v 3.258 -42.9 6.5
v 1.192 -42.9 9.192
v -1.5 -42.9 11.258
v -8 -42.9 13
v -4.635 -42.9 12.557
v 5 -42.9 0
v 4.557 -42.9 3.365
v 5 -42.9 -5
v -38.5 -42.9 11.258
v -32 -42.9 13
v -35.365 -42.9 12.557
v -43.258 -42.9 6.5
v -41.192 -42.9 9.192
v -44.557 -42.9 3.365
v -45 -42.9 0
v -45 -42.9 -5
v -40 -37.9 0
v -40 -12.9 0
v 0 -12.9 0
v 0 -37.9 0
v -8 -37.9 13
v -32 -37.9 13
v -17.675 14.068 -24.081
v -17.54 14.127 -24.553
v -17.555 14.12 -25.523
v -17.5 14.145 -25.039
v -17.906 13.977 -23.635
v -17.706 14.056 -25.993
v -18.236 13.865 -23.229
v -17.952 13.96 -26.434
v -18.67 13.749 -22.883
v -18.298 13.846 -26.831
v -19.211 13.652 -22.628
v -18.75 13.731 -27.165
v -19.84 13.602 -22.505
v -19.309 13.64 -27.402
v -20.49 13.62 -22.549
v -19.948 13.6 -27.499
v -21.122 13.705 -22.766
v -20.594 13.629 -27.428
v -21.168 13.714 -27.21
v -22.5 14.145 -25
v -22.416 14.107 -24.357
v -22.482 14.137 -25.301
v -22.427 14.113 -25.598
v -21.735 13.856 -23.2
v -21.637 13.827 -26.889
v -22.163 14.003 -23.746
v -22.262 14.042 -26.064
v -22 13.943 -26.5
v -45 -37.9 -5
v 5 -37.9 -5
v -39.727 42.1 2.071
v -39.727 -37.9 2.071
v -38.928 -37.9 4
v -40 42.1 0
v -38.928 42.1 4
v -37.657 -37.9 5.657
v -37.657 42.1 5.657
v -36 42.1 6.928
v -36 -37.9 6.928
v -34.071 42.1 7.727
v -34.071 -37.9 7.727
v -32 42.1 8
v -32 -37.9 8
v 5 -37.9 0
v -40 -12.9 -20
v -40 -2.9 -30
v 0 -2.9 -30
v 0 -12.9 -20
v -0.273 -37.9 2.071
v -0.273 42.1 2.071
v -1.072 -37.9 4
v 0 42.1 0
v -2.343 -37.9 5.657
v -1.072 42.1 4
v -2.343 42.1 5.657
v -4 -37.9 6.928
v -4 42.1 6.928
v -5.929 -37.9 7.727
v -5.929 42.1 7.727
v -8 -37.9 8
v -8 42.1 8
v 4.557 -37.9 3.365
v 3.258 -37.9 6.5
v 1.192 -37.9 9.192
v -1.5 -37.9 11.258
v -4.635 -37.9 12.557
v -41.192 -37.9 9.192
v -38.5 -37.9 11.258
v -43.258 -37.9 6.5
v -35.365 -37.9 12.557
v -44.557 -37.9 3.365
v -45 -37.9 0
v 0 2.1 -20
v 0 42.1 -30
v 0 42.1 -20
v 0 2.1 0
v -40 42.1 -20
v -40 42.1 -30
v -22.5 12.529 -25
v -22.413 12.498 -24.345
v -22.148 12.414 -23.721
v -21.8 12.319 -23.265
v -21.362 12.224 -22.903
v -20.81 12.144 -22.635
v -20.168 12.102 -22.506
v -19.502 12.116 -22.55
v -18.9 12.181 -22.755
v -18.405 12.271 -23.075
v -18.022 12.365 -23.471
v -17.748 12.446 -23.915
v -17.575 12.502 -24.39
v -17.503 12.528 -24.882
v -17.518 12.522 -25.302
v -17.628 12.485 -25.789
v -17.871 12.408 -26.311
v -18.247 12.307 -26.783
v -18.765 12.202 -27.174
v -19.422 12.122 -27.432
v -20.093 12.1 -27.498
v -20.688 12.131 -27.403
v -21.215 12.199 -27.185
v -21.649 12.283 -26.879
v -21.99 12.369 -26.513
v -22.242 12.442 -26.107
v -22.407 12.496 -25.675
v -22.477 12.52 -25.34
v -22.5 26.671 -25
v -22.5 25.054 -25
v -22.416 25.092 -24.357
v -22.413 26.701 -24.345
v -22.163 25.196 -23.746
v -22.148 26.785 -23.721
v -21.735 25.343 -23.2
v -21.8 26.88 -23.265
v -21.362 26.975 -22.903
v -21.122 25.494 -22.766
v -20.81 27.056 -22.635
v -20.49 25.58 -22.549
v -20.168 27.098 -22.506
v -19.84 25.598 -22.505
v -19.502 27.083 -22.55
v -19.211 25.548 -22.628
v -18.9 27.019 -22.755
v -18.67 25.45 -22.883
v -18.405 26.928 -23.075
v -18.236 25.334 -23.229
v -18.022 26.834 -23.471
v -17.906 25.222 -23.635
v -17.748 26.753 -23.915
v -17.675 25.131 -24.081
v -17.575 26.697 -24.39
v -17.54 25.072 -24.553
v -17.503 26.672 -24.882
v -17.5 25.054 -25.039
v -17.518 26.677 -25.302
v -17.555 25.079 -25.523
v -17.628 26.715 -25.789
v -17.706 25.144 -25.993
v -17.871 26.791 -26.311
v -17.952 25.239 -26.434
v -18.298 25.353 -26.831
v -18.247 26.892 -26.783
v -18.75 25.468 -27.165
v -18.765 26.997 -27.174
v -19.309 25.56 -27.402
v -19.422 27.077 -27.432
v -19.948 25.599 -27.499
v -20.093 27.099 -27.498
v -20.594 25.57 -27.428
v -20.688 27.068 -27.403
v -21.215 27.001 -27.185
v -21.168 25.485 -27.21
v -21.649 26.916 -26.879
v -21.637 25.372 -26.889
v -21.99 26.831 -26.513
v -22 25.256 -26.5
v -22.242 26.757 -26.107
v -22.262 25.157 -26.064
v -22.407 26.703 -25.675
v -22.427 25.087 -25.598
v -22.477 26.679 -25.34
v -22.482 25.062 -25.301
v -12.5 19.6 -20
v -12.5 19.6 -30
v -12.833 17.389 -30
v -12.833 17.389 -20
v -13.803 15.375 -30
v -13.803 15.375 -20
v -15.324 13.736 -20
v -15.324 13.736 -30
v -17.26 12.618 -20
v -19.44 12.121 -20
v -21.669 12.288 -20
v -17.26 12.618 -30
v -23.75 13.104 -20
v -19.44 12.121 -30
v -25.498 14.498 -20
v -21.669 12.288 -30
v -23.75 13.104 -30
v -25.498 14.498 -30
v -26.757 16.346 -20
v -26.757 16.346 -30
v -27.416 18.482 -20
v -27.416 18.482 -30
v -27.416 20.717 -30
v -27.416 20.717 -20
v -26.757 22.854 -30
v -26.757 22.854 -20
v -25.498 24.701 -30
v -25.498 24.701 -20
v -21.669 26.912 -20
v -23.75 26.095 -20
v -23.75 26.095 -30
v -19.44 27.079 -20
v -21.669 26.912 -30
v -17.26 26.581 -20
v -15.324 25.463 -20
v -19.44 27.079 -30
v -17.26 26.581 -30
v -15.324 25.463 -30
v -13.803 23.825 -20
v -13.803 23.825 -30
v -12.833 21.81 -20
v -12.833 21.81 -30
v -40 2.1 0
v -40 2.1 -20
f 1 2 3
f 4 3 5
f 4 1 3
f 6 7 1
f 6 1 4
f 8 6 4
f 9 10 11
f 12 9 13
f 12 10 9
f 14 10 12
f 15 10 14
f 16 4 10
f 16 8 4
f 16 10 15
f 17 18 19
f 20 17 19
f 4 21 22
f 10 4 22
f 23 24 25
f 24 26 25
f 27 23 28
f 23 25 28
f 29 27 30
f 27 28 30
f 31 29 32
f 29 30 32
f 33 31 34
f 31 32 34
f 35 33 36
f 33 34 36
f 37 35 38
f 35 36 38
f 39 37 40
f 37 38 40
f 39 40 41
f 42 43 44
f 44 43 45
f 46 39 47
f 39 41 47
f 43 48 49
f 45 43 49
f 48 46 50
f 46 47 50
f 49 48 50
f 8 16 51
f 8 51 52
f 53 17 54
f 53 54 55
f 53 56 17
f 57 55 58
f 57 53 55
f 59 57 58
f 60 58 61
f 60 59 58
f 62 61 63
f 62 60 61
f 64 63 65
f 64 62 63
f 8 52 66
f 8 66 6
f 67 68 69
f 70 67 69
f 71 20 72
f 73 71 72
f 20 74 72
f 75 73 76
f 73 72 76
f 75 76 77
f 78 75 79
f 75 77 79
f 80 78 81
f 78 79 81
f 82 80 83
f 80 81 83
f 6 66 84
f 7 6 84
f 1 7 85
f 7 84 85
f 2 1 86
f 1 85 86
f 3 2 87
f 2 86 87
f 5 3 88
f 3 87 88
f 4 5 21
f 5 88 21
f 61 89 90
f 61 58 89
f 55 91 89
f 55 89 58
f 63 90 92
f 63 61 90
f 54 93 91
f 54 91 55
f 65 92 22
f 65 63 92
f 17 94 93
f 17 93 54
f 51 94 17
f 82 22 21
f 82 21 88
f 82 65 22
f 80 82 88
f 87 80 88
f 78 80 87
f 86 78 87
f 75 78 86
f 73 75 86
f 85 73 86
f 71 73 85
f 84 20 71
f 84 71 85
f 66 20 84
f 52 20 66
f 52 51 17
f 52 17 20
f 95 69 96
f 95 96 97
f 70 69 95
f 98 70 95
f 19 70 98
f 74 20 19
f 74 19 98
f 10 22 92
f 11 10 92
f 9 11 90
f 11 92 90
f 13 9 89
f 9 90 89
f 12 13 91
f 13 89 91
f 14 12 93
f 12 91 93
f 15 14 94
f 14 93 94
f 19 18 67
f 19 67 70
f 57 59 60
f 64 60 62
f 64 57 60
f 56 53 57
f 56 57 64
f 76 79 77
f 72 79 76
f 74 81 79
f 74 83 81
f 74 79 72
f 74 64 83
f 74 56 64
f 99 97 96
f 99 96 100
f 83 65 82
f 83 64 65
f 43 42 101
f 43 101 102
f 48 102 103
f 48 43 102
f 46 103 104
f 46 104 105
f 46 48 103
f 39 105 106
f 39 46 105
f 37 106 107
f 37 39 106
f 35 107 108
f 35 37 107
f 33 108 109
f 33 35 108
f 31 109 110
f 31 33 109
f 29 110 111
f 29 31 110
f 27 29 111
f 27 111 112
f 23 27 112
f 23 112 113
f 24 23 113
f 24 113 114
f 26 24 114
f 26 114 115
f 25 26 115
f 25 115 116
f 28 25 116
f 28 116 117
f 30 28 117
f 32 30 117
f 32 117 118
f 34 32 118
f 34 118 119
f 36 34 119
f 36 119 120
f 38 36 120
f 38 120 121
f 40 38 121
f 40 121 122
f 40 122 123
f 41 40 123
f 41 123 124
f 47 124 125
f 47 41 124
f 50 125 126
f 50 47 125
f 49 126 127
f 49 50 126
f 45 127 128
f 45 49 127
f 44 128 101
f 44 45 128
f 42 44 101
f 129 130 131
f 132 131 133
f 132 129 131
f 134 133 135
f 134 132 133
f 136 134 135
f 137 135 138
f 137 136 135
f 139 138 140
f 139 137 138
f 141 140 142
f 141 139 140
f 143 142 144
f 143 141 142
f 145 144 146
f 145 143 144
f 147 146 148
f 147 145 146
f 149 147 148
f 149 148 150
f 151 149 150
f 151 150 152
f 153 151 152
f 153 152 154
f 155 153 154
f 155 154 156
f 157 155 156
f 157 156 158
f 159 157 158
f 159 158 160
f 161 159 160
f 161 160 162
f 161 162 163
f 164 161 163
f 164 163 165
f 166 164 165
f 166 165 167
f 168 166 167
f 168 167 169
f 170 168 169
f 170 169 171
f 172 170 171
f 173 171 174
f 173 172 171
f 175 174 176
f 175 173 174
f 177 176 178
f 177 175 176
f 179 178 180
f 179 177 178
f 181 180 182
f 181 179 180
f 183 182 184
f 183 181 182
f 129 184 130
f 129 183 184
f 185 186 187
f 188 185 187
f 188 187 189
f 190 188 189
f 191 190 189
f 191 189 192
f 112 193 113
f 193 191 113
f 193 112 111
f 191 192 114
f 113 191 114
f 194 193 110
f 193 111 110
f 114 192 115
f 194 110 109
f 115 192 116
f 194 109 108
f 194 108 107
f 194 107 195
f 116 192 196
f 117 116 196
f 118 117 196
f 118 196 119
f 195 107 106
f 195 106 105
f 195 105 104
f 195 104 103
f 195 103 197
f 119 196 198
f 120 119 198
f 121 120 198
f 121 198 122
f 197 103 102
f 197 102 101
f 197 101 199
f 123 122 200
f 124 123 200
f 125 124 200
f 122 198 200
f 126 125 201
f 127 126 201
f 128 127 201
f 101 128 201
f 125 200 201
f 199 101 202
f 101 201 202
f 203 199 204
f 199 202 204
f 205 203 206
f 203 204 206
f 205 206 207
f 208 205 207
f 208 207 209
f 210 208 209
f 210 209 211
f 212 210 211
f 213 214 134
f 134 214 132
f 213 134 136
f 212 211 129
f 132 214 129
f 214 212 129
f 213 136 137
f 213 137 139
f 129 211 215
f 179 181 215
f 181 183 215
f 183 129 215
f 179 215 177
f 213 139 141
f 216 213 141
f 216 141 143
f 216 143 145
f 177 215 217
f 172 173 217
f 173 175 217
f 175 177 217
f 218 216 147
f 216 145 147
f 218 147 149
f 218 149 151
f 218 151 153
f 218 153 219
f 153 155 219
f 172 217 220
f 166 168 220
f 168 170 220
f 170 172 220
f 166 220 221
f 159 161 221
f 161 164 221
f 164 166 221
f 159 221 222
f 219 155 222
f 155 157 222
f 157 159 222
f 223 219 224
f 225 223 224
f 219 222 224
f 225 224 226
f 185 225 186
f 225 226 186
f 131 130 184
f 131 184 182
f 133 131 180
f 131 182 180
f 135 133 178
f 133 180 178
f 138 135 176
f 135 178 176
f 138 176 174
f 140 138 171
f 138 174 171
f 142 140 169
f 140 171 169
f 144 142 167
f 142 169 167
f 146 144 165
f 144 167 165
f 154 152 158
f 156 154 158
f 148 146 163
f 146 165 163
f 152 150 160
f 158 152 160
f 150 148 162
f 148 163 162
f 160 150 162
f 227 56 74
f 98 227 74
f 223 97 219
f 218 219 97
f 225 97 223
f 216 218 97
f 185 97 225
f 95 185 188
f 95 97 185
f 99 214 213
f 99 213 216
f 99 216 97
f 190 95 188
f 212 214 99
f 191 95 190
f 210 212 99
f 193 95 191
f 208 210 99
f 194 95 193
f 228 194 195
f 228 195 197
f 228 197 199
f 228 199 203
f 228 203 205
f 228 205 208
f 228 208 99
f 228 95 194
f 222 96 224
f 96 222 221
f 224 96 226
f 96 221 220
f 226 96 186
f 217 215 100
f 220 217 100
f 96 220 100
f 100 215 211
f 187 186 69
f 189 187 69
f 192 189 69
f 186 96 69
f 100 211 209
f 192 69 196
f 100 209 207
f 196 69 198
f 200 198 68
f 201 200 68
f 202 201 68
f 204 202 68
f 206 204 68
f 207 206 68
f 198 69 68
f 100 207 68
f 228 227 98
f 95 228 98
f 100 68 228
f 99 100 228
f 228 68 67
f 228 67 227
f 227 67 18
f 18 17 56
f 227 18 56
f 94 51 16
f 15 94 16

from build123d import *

# Parameters (mm, degrees)
F0_W      = 40
F0_H      = 80
F1_DEPTH  = 8
F2_W      = 40
F2_H      = 15
F3_DEPTH  = 30
F4_W      = 40
F4_H      = 10
F5_DEPTH  = 40
F6_R      = 7.99999
F7_SIZE2  = 10
F7_SIZE   = 10
F9_DEPTH  = 5
F10_W     = 48
F10_H     = 5
F10_W_2   = 1
F11_DEPTH = 5
F12_R     = 7.5
F12_R_2   = 6
F13_DEPTH = 11
F14_R     = 2.5
F15_DEPTH = 32
F16_DEPTH = 25


# Not quite as in the source:
# - a fillet or chamfer is up to 0.001 mm smaller than in the source, because OpenCascade refuses the exact size


with BuildPart() as f1:
    # F0 (on Top) → F1 (new body)
    with BuildSketch(Plane.XY):
        with Locations((-20, 2.0996452868)):
            Rectangle(F0_W, F0_H)
    extrude(amount=F1_DEPTH)

    # F2 (on face) → F3 (join)
    with BuildSketch(Plane(origin=(0, 0, 0), x_dir=(1, 0, 0), z_dir=(0, 0, -1))):
        with Locations((-20, 5.4003547132)):
            Rectangle(F2_W, F2_H)
    extrude(amount=F3_DEPTH)

    # F4 (on face) → F5 (join)
    with BuildSketch(Plane(origin=(0, 2.0996452868, 0), x_dir=(-1, 0, 0), z_dir=(0, 1, 0))):
        with Locations((20, -25)):
            Rectangle(F4_W, F4_H)
    extrude(amount=F5_DEPTH)

    # F6 (radius 8 in the source; OpenCascade refuses exactly that, so slightly less here)
    f6_edges = [f1.edges().sort_by_distance(p)[0] for p in [
        (0, 2.099645, 8),
        (-40, 2.099645, 8),
    ]]
    fillet(f6_edges, radius=F6_R)

    # F7
    f7_edges = [f1.edges().sort_by_distance(p)[0] for p in [
        (-20, -12.900355, -30),
    ]]
    chamfer(f7_edges, length=F7_SIZE, length2=F7_SIZE2)

    # F8 (on face) → F9 (join)
    with BuildSketch(Plane.XZ.offset(37.9003547132)):
        with BuildLine():
            Line((-44, -5), (4, -5))
            ThreePointArc((4, -5), (2.8166538264, 7.2111025509), (-8, 13))
            Line((-8, 13), (-32, 13))
            ThreePointArc((-32, 13), (-42.8166538264, 7.2111025509), (-44, -5))
        make_face()
    extrude(amount=F9_DEPTH)

    # F10 (on face) → F11 (join)
    with BuildSketch(Plane(origin=(0, 0, -5), x_dir=(1, 0, 0), z_dir=(0, 0, -1))):
        with Locations((-20, 40.4003547132)):
            Rectangle(F10_W, F10_H)
        with Locations((-44.5, 40.4003547132)):
            Rectangle(F10_W_2, F10_H)
        with Locations((4.5, 40.4003547132)):
            Rectangle(F10_W_2, F10_H)
    extrude(amount=-F11_DEPTH)

    # F12 (on face) → F13 (cut)
    with BuildSketch(Plane(origin=(0, 0, -30), x_dir=(1, 0, 0), z_dir=(0, 0, -1))):
        with Locations((-20, -19.5996452868)):
            Circle(F12_R)
        with Locations((-20, -19.5996452868)):
            Circle(F12_R_2, mode=Mode.SUBTRACT)
        with Locations((-20, -19.5996452868)):
            Circle(F12_R_2)
    extrude(amount=-F13_DEPTH, mode=Mode.SUBTRACT)

    # F14 (on face) → F15 (join)
    with BuildSketch(Plane(origin=(0, 42.0996452868, 0), x_dir=(-1, 0, 0), z_dir=(0, 1, 0))):
        with Locations((20, -25)):
            Circle(F14_R)
    extrude(amount=-F15_DEPTH)

    # F12 (on face) → F16 (cut)
    with BuildSketch(Plane(origin=(0, 0, -30), x_dir=(1, 0, 0), z_dir=(0, 0, -1))):
        with Locations((-20, -19.5996452868)):
            Circle(F12_R_2)
    extrude(amount=-F16_DEPTH, mode=Mode.SUBTRACT)


solid = f1.part
